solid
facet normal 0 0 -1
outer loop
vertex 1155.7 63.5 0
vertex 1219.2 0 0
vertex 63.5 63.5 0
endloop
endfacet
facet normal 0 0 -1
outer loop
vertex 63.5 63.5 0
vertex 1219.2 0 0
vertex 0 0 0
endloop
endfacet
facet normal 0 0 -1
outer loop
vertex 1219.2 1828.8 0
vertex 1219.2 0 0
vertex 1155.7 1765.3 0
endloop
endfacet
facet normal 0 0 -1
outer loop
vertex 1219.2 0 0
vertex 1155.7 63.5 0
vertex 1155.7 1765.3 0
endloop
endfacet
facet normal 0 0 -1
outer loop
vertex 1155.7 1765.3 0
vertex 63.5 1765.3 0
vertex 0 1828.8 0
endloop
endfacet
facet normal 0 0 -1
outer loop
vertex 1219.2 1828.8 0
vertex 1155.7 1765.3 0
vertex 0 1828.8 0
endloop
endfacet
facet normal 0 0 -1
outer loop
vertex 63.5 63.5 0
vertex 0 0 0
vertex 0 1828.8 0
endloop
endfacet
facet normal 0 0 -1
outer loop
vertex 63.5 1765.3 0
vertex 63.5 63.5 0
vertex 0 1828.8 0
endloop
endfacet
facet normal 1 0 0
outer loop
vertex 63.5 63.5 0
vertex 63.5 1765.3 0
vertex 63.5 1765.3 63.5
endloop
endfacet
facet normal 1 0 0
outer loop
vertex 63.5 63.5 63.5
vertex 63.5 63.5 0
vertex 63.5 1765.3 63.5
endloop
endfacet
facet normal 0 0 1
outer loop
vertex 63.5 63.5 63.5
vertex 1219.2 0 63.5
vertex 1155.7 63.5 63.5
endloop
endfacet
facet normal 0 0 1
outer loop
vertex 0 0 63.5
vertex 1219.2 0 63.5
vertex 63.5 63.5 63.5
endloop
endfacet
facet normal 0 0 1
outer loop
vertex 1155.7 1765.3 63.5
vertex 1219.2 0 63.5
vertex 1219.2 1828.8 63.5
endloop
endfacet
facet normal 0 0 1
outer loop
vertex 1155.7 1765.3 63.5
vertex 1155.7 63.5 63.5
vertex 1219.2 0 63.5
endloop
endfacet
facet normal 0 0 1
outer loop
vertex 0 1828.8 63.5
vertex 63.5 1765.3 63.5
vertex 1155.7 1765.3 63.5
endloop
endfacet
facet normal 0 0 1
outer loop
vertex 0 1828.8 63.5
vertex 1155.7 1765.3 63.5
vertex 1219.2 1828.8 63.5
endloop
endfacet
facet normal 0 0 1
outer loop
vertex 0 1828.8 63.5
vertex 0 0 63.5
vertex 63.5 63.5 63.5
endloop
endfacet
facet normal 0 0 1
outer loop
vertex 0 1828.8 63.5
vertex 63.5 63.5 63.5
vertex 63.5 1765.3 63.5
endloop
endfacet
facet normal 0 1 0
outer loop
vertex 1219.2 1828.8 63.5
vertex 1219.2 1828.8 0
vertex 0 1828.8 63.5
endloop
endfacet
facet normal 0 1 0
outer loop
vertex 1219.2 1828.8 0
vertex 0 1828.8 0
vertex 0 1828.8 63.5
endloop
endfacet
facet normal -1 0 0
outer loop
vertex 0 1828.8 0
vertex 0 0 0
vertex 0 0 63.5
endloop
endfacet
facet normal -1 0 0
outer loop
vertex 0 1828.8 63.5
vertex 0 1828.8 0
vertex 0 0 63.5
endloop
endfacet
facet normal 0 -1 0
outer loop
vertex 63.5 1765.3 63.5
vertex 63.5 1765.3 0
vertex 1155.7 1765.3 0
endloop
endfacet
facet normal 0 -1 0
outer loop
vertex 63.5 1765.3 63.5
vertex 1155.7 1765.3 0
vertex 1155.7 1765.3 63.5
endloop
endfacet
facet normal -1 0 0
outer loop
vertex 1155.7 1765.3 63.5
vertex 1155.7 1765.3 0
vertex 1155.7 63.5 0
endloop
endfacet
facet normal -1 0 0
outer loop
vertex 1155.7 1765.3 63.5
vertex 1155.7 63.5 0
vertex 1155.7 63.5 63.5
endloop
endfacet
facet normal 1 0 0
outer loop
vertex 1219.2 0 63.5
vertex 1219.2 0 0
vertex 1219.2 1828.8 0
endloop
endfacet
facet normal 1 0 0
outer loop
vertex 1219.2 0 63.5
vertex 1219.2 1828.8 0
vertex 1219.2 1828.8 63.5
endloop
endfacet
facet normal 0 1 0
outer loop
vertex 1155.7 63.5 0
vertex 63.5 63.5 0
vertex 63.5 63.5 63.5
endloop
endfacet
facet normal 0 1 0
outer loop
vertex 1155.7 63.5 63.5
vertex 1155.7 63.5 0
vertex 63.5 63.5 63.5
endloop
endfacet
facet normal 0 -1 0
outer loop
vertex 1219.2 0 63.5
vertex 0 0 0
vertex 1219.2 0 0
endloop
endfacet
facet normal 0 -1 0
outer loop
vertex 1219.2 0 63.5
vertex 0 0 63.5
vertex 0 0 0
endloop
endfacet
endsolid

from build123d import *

# Parameters (mm, degrees)
F0_W     = 63.5
F0_H     = 63.5
F1_DEPTH = 1828.8
F2_W     = 63.5
F2_H     = 63.5
F3_DEPTH = 1092.2
F4_W     = 63.5
F4_H     = 63.5
F5_DEPTH = 1828.8
F6_W     = 63.5
F6_H     = 63.5
F7_DEPTH = 1092.2


with BuildPart() as f1:
    # F0 (on Front) → F1 (new body)
    with BuildSketch(Plane.XZ):
        with Locations((31.75, 31.75)):
            Rectangle(F0_W, F0_H)
    extrude(amount=-F1_DEPTH)

    # F2 (on face) → F3 (join)
    with BuildSketch(Plane.YZ.offset(63.5)):
        with Locations((31.75, 31.75)):
            Rectangle(F2_W, F2_H)
    extrude(amount=F3_DEPTH)

    # F4 (on face) → F5 (join)
    with BuildSketch(Plane.XZ):
        with Locations((1187.45, 31.75)):
            Rectangle(F4_W, F4_H)
    extrude(amount=-F5_DEPTH)

    # F6 (on face) → F7 (join)
    with BuildSketch(Plane.YZ.offset(63.5)):
        with Locations((1797.05, 31.75)):
            Rectangle(F6_W, F6_H)
    extrude(amount=F7_DEPTH)


solid = f1.part
